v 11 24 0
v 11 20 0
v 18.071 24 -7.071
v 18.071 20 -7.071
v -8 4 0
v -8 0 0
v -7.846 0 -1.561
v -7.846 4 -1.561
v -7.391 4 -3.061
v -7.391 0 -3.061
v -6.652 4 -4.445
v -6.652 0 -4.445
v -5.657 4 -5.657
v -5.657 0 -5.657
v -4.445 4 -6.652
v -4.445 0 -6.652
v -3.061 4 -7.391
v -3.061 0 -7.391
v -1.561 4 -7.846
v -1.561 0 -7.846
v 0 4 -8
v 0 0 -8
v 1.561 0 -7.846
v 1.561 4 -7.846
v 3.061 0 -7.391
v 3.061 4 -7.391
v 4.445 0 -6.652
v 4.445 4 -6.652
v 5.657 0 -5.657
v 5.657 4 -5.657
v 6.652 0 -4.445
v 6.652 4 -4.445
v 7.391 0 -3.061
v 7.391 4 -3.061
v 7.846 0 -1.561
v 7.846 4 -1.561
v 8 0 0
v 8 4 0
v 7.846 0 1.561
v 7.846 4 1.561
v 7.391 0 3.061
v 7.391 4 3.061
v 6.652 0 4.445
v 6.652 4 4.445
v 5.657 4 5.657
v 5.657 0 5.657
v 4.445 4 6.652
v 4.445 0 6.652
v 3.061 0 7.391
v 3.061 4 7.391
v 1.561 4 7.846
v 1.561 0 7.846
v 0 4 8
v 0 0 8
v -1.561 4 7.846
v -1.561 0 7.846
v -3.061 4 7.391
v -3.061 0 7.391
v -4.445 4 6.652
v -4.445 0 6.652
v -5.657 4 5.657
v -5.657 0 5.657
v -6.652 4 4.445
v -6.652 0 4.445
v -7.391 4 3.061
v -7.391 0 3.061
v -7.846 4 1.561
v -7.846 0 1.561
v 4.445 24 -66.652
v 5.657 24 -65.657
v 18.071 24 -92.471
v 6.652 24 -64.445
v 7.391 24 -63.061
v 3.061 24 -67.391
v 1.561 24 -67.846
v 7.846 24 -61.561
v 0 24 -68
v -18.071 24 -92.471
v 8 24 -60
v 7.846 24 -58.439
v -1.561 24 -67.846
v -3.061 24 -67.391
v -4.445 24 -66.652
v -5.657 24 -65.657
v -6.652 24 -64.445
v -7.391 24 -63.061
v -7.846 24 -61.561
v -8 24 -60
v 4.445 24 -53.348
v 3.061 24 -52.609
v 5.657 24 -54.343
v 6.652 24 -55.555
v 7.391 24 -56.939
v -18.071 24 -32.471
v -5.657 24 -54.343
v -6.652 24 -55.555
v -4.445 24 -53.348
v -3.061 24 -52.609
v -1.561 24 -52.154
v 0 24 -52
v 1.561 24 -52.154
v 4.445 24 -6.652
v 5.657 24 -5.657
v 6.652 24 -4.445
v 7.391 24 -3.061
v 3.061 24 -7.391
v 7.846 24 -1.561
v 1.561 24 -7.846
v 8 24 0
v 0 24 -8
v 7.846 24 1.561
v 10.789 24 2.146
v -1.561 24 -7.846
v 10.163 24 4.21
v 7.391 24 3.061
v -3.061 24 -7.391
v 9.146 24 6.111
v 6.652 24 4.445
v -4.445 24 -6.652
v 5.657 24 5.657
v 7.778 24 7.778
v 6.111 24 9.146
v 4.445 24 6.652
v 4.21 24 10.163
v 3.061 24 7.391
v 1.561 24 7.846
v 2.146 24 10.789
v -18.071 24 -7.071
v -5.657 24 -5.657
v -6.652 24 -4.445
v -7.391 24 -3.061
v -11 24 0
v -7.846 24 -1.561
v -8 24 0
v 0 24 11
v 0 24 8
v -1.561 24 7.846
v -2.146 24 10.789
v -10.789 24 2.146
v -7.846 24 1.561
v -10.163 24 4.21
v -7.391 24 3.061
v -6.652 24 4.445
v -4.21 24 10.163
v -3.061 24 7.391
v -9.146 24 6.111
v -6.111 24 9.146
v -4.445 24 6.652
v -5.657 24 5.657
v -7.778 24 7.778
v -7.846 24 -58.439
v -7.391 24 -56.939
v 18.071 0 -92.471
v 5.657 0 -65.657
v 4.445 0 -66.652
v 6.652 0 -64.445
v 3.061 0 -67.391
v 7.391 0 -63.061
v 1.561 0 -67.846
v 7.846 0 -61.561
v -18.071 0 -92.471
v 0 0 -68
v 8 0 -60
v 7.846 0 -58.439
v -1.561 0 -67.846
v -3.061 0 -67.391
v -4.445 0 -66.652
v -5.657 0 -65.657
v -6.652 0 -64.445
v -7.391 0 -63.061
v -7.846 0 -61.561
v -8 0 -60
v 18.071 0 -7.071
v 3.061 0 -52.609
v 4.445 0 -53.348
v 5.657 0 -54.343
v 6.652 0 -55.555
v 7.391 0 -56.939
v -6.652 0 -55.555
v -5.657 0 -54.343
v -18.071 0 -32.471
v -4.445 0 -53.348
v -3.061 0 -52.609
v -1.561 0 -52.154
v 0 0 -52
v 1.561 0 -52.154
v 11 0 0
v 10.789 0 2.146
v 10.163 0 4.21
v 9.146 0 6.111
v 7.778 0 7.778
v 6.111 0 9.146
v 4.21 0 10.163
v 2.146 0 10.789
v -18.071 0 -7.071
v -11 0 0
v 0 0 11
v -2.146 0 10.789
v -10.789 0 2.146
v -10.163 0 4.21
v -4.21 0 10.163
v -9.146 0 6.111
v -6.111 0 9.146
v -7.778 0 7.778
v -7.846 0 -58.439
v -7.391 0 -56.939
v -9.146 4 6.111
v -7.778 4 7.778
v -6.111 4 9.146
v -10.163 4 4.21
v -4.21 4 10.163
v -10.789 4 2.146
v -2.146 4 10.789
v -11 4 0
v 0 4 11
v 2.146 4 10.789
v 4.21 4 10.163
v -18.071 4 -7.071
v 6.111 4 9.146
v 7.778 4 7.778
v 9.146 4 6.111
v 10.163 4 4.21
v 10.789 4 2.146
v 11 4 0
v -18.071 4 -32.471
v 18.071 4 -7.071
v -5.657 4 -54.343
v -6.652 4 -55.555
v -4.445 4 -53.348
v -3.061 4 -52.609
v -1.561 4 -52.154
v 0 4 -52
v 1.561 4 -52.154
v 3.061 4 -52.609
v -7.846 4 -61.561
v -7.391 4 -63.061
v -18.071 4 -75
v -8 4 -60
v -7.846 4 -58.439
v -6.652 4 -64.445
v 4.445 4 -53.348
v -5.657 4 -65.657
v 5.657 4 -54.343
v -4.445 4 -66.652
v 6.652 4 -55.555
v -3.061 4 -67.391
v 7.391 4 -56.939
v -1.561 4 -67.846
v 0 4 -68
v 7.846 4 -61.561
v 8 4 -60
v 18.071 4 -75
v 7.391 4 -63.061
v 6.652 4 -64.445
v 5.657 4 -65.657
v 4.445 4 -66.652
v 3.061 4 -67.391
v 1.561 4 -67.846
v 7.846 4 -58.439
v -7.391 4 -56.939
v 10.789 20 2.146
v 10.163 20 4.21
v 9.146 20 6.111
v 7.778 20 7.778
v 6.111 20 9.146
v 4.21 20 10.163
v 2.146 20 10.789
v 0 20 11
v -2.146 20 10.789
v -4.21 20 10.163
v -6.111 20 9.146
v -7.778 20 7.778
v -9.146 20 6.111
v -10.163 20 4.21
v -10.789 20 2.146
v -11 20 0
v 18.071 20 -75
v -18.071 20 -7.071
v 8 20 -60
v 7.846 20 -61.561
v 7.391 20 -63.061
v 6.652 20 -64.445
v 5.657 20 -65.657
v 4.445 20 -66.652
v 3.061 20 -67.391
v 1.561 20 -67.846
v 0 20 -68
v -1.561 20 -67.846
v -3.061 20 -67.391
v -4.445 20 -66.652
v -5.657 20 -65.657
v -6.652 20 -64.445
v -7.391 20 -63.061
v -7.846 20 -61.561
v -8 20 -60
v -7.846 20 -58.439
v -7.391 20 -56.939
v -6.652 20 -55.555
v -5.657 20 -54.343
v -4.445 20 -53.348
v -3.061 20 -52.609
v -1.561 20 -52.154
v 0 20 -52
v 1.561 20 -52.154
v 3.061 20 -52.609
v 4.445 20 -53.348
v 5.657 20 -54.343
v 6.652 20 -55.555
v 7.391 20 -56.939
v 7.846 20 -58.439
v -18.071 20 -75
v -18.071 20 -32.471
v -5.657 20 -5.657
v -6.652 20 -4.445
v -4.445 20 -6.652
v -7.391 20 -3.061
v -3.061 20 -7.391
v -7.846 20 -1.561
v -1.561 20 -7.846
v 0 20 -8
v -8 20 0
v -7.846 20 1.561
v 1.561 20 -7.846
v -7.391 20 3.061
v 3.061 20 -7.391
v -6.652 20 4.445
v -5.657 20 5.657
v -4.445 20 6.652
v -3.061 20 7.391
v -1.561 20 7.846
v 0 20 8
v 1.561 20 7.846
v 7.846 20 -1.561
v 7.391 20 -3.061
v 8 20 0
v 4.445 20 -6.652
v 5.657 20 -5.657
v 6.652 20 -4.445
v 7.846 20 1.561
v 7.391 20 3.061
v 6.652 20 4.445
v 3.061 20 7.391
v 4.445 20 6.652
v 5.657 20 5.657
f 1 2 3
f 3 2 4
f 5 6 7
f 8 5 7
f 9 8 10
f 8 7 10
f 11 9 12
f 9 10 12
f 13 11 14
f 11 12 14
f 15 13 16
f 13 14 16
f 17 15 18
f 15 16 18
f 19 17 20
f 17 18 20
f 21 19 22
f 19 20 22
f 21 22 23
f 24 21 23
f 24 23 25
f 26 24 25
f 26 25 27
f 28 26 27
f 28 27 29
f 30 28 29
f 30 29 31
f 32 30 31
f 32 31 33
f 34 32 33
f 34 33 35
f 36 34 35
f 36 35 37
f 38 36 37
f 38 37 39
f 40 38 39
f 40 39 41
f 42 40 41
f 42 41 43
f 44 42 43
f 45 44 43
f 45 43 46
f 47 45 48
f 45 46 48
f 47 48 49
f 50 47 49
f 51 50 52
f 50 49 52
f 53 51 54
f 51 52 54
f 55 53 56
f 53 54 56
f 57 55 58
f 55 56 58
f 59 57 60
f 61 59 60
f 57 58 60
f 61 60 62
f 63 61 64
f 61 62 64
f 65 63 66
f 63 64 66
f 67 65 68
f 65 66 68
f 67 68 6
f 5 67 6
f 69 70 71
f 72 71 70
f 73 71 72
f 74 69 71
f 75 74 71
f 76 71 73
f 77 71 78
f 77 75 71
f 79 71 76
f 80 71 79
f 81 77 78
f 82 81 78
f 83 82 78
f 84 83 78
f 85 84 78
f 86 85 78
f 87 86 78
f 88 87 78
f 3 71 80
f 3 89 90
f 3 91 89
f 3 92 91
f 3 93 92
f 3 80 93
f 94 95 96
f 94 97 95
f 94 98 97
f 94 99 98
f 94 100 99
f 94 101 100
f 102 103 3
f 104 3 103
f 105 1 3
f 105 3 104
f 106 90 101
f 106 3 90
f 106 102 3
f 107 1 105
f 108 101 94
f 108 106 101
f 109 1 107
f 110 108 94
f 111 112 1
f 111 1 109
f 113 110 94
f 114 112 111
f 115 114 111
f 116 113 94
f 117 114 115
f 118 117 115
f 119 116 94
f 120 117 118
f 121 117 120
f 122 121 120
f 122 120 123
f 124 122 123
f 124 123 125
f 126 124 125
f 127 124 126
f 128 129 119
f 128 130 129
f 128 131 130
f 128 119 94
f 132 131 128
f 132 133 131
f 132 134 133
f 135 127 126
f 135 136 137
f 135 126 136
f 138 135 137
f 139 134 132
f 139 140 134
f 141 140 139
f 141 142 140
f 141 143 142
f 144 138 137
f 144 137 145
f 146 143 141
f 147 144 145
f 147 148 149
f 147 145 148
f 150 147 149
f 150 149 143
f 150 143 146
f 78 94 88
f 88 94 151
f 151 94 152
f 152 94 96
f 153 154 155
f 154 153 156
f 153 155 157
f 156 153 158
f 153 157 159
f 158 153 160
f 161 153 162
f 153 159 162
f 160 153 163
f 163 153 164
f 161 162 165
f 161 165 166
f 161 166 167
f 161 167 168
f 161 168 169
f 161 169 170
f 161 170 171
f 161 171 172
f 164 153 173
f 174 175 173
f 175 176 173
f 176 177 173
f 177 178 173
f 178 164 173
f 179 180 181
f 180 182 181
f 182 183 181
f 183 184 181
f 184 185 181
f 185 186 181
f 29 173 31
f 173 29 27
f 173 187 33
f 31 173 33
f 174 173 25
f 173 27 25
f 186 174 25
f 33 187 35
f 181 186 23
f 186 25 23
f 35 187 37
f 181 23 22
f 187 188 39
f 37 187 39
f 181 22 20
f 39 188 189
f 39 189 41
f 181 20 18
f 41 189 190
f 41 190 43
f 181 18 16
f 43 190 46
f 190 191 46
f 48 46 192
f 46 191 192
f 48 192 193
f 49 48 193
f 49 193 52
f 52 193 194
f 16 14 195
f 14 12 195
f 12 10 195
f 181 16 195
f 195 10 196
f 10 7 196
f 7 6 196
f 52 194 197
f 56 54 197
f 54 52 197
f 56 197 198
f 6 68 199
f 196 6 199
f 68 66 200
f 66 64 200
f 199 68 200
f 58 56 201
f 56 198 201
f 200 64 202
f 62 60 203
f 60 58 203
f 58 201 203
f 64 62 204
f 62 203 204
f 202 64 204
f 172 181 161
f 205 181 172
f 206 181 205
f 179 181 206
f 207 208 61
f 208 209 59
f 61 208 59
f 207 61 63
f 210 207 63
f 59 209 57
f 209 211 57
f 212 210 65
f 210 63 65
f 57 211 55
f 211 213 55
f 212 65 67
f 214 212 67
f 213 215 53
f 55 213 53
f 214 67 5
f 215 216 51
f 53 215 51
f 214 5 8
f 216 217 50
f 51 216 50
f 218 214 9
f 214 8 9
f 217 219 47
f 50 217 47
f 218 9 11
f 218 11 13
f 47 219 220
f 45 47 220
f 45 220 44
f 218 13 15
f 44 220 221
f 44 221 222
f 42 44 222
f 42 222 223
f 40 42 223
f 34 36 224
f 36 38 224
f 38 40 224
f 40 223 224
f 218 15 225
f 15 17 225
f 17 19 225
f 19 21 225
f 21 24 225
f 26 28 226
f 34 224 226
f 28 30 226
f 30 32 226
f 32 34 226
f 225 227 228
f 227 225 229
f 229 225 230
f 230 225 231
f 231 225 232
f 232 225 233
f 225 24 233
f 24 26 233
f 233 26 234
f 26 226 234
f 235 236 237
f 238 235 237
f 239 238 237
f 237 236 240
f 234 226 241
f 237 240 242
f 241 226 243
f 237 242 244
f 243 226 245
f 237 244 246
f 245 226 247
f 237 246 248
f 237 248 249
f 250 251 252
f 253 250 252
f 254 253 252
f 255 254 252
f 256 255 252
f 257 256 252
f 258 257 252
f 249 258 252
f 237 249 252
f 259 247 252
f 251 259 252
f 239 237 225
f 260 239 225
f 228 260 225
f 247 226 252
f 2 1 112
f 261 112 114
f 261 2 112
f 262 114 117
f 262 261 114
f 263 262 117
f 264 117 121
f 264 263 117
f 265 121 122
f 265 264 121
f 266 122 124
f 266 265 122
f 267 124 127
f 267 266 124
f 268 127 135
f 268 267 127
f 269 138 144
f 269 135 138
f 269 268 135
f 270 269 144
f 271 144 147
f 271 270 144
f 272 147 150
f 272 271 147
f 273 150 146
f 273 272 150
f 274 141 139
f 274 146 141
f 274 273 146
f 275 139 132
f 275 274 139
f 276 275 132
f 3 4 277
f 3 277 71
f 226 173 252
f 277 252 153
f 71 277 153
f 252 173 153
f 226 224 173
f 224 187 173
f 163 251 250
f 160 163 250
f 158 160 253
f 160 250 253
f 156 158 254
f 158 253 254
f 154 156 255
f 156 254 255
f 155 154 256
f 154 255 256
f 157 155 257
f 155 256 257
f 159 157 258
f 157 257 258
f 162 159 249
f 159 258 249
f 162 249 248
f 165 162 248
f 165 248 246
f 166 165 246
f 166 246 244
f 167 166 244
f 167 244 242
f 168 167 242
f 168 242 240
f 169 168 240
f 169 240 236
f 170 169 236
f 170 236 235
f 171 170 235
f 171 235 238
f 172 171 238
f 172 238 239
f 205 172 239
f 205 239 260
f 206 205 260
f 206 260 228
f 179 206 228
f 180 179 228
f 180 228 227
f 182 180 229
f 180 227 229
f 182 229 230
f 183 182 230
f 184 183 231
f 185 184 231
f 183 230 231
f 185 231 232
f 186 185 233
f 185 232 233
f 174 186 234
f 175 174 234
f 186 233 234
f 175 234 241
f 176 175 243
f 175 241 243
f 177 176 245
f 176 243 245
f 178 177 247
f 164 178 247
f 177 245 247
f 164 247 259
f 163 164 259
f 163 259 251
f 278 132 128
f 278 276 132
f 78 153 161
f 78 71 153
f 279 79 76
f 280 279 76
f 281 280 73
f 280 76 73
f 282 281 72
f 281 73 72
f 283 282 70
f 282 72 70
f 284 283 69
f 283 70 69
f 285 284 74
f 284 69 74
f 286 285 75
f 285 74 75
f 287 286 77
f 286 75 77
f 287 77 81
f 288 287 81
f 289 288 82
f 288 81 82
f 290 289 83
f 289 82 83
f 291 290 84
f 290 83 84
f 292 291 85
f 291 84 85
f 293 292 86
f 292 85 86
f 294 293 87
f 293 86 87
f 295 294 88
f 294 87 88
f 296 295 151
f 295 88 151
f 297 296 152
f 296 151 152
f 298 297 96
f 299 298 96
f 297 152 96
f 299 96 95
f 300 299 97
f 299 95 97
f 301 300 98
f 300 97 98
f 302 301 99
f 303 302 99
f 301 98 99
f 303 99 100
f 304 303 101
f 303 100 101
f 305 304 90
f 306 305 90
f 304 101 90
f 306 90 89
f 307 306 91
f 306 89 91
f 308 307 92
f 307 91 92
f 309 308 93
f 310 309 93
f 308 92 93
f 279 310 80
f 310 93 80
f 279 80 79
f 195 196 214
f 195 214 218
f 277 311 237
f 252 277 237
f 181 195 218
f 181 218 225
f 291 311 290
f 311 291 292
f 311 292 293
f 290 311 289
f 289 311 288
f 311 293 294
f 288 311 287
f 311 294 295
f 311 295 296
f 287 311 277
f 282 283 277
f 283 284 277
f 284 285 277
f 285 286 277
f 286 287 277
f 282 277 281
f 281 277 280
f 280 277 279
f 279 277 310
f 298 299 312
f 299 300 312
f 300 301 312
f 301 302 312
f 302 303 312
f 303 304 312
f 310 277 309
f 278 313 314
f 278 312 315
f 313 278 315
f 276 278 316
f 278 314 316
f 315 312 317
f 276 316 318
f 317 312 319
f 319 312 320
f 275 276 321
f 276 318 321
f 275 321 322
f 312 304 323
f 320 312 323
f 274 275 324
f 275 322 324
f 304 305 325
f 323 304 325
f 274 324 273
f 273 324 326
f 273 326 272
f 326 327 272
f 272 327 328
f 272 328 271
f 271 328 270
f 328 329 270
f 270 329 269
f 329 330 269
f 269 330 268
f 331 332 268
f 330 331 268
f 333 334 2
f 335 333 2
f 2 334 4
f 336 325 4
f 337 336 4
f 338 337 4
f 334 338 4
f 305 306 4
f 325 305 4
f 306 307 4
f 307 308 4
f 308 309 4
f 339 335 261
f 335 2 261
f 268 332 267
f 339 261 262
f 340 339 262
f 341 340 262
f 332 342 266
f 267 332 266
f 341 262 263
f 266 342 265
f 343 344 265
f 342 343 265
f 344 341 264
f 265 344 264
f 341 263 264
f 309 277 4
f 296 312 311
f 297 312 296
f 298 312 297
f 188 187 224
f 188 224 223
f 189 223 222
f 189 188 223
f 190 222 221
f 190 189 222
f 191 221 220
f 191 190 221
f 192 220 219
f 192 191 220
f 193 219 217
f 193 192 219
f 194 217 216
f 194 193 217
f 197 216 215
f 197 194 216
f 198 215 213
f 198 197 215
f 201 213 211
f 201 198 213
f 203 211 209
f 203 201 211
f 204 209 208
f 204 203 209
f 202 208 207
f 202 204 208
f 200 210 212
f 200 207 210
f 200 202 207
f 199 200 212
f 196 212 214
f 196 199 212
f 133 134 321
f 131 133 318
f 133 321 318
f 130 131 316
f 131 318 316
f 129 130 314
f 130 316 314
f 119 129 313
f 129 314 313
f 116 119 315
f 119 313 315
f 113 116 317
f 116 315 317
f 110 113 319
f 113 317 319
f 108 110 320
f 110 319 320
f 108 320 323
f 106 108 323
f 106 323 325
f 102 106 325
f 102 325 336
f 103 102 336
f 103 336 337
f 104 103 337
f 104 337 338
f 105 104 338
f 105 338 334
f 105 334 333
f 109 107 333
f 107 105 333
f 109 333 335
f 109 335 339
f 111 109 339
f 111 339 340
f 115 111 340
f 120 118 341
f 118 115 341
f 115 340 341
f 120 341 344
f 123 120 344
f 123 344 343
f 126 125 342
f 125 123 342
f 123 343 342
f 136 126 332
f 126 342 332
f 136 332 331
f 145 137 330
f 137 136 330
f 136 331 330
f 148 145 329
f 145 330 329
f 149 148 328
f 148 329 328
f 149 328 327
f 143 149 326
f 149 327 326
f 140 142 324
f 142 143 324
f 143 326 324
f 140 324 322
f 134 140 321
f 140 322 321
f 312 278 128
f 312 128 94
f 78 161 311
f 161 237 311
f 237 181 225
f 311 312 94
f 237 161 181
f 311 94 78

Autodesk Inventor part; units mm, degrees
ref_plane "YZ Plane" through (0, 0, 0) normal (1, 0, 0) x (0, 1, 0)
ref_plane "XZ Plane" through (0, 0, 0) normal (0, 1, 0) x (-1, 0, 0)
ref_plane "XY Plane" through (0, 0, 0) normal (0, 0, 1) x (1, 0, 0)
sketch "Sketch1" plane through (0, 0, 0) normal (0, 1, 0) x (-1, 0, 0)
  circle A0 centre (0, 0) radius 8
  arc A1 (11, 0) -> (-11, 0) centre (0, 0) ccw
  line L0 (-11, 0) -> (-18.0711, -7.0711)
  line L1 (-11, 0) -> (-1, 0) construction
  line L2 (-18.0711, -7.0711) -> (-18.0711, -32.4711)
  line L3 (11, 0) -> (18.0711, -7.0711)
  line L4 (11, 0) -> (21, 0) construction
  line L5 (18.0711, -7.0711) -> (18.0711, -32.4711)
  line L6 (18.0711, -32.4711) -> (-18.0711, -32.4711)
  dimension "d0" = 16
  dimension "d2" = 10
  dimension "d3" = 135
  dimension "d4" = 25.4
  dimension "d5" = 10
  dimension "d6" = 45
extrude "Extrusion1" add sketch "Sketch1" along normal blind 24
sketch "Sketch2" plane through (18.0711, 0, -32.4711) normal (0, 0, -1) x (-1, 0, 0)
  line L0 (7.0711, 0) -> (0, 0) projected
  line L1 (0, 24) -> (36.1421, 24) projected
  line L2 (0, 0) -> (36.1421, 0)
  line L3 (36.1421, 0) -> (36.1421, 24)
  line L4 (36.1421, 24) -> (0, 24)
  line L5 (0, 24) -> (0, 0)
  point P0 (18.0711, 0)
extrude "Extrusion2" add sketch "Sketch2" along normal blind 60
sketch "Sketch3" plane through (18.0711, 0, -7.0711) normal (1, 0, 0) x (0, 0, -1)
  line L0 (-7.0711, 0) -> (-7.0711, 24) projected
  line L1 (52.9289, 12) -> (52.9289, 20)
  line L2 (52.9289, 12) -> (52.9289, 4)
  line L3 (52.9289, 4) -> (-7.0711, 4)
  line L4 (-7.0711, 4) -> (-7.0711, 20)
  line L5 (-7.0711, 20) -> (52.9289, 20)
  line L6 (-18.0711, 0) -> (-18.0711, 24) projected
  line L7 (-7.0711, 20) -> (-18.0711, 20)
  line L8 (-18.0711, 20) -> (-18.0711, 4)
  line L9 (-18.0711, 4) -> (-7.0711, 4)
  line L10 (-7.0711, 4) -> (-7.0711, 20)
  line L11 (67.9289, 12) -> (67.9289, 20)
  line L12 (67.9289, 20) -> (52.9289, 20)
  line L13 (67.9289, 12) -> (67.9289, 4)
  line L14 (67.9289, 4) -> (52.9289, 4)
  dimension "d13" = 8
extrude "Extrusion3" cut sketch "Sketch3" against normal through all
sketch "Sketch4" plane through (0, 24, 0) normal (0, 1, 0) x (1, 0, 0)
  circle A0 centre (0, 60) radius 8
  point P0 (0, 0)
  dimension "d18" = 16
extrude "Extrusion4" cut sketch "Sketch4" against normal through all
properties part number "Joint1"
